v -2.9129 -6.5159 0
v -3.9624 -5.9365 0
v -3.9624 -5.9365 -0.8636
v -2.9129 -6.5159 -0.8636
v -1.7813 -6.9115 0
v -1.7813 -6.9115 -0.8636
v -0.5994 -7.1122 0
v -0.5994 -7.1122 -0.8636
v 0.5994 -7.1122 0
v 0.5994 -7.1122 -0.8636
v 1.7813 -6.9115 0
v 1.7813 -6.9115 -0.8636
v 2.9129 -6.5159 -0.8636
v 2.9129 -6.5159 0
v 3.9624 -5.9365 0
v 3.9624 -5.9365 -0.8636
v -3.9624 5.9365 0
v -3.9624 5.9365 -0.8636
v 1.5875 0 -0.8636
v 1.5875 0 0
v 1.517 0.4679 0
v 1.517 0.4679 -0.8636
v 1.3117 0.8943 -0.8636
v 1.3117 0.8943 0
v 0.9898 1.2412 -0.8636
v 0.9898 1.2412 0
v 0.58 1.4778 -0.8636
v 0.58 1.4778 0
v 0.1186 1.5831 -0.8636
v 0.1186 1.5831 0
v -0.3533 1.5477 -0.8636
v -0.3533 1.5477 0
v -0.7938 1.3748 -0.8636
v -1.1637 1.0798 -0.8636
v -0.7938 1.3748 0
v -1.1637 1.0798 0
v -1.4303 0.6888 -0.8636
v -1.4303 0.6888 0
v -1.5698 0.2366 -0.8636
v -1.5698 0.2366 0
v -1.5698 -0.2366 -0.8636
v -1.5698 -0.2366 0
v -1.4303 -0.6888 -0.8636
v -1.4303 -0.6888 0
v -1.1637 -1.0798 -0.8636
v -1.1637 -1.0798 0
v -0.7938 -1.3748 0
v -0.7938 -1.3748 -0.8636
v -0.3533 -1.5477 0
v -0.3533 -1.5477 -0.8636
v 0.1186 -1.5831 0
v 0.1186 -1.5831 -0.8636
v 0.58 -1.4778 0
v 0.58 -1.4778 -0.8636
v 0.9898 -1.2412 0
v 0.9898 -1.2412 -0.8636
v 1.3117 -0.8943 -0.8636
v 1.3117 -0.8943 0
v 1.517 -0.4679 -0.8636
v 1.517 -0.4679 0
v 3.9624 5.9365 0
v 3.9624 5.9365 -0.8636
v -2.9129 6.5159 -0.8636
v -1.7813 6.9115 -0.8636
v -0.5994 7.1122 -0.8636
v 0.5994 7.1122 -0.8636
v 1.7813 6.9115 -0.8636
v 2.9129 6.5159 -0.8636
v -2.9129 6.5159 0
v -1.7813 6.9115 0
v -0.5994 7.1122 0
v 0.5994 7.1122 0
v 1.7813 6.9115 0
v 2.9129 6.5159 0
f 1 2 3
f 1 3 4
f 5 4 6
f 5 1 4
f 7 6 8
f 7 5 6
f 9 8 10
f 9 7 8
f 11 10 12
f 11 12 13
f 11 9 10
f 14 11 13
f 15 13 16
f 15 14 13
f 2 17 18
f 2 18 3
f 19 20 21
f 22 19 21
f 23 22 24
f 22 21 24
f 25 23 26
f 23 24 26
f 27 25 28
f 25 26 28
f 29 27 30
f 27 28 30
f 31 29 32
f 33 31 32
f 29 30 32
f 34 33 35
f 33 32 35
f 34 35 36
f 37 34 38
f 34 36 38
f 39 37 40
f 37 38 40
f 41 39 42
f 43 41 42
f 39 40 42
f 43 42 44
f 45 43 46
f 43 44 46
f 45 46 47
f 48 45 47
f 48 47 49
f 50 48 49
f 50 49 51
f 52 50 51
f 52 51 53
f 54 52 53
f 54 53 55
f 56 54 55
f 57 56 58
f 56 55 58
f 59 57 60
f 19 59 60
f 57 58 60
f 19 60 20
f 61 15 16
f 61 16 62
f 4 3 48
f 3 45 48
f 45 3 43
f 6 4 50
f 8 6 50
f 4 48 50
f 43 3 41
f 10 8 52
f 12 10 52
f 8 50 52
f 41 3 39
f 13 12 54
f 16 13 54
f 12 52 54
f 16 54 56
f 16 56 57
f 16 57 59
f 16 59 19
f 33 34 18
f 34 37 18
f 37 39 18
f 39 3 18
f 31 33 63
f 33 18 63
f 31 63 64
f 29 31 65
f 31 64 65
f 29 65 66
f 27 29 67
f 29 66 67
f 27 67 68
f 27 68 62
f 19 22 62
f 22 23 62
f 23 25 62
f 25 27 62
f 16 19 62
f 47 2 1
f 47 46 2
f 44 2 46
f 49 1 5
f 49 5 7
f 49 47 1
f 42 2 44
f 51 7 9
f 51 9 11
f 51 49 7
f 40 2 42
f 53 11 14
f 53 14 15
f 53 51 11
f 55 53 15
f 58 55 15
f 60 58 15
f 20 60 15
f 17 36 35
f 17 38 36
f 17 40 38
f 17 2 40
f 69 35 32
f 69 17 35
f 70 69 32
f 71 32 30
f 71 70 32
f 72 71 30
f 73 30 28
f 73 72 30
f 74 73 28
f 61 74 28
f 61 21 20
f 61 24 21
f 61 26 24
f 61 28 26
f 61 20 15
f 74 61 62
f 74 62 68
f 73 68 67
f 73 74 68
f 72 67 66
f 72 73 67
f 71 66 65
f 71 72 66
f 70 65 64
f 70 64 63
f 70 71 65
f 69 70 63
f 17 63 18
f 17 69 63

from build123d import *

# Parameters (mm, degrees)
SKETCH1_R      = 1.5875
EXTRUDE1_DEPTH = 0.8636


with BuildPart() as part:
    # Sketch1 → Extrude1 (new body)
    with BuildSketch(Plane.XY):
        with BuildLine():
            Line((-3.9624, 5.936485913), (-3.9624, -5.936485913))
            ThreePointArc((-3.9624, -5.936485913), (0, -7.1374), (3.9624, -5.936485913))
            Line((3.9624, -5.936485913), (3.9624, 5.936485913))
            ThreePointArc((3.9624, 5.936485913), (0, 7.1374), (-3.9624, 5.936485913))
        make_face()
        Circle(SKETCH1_R, mode=Mode.SUBTRACT)
    extrude(amount=-EXTRUDE1_DEPTH)


solid = part.part
